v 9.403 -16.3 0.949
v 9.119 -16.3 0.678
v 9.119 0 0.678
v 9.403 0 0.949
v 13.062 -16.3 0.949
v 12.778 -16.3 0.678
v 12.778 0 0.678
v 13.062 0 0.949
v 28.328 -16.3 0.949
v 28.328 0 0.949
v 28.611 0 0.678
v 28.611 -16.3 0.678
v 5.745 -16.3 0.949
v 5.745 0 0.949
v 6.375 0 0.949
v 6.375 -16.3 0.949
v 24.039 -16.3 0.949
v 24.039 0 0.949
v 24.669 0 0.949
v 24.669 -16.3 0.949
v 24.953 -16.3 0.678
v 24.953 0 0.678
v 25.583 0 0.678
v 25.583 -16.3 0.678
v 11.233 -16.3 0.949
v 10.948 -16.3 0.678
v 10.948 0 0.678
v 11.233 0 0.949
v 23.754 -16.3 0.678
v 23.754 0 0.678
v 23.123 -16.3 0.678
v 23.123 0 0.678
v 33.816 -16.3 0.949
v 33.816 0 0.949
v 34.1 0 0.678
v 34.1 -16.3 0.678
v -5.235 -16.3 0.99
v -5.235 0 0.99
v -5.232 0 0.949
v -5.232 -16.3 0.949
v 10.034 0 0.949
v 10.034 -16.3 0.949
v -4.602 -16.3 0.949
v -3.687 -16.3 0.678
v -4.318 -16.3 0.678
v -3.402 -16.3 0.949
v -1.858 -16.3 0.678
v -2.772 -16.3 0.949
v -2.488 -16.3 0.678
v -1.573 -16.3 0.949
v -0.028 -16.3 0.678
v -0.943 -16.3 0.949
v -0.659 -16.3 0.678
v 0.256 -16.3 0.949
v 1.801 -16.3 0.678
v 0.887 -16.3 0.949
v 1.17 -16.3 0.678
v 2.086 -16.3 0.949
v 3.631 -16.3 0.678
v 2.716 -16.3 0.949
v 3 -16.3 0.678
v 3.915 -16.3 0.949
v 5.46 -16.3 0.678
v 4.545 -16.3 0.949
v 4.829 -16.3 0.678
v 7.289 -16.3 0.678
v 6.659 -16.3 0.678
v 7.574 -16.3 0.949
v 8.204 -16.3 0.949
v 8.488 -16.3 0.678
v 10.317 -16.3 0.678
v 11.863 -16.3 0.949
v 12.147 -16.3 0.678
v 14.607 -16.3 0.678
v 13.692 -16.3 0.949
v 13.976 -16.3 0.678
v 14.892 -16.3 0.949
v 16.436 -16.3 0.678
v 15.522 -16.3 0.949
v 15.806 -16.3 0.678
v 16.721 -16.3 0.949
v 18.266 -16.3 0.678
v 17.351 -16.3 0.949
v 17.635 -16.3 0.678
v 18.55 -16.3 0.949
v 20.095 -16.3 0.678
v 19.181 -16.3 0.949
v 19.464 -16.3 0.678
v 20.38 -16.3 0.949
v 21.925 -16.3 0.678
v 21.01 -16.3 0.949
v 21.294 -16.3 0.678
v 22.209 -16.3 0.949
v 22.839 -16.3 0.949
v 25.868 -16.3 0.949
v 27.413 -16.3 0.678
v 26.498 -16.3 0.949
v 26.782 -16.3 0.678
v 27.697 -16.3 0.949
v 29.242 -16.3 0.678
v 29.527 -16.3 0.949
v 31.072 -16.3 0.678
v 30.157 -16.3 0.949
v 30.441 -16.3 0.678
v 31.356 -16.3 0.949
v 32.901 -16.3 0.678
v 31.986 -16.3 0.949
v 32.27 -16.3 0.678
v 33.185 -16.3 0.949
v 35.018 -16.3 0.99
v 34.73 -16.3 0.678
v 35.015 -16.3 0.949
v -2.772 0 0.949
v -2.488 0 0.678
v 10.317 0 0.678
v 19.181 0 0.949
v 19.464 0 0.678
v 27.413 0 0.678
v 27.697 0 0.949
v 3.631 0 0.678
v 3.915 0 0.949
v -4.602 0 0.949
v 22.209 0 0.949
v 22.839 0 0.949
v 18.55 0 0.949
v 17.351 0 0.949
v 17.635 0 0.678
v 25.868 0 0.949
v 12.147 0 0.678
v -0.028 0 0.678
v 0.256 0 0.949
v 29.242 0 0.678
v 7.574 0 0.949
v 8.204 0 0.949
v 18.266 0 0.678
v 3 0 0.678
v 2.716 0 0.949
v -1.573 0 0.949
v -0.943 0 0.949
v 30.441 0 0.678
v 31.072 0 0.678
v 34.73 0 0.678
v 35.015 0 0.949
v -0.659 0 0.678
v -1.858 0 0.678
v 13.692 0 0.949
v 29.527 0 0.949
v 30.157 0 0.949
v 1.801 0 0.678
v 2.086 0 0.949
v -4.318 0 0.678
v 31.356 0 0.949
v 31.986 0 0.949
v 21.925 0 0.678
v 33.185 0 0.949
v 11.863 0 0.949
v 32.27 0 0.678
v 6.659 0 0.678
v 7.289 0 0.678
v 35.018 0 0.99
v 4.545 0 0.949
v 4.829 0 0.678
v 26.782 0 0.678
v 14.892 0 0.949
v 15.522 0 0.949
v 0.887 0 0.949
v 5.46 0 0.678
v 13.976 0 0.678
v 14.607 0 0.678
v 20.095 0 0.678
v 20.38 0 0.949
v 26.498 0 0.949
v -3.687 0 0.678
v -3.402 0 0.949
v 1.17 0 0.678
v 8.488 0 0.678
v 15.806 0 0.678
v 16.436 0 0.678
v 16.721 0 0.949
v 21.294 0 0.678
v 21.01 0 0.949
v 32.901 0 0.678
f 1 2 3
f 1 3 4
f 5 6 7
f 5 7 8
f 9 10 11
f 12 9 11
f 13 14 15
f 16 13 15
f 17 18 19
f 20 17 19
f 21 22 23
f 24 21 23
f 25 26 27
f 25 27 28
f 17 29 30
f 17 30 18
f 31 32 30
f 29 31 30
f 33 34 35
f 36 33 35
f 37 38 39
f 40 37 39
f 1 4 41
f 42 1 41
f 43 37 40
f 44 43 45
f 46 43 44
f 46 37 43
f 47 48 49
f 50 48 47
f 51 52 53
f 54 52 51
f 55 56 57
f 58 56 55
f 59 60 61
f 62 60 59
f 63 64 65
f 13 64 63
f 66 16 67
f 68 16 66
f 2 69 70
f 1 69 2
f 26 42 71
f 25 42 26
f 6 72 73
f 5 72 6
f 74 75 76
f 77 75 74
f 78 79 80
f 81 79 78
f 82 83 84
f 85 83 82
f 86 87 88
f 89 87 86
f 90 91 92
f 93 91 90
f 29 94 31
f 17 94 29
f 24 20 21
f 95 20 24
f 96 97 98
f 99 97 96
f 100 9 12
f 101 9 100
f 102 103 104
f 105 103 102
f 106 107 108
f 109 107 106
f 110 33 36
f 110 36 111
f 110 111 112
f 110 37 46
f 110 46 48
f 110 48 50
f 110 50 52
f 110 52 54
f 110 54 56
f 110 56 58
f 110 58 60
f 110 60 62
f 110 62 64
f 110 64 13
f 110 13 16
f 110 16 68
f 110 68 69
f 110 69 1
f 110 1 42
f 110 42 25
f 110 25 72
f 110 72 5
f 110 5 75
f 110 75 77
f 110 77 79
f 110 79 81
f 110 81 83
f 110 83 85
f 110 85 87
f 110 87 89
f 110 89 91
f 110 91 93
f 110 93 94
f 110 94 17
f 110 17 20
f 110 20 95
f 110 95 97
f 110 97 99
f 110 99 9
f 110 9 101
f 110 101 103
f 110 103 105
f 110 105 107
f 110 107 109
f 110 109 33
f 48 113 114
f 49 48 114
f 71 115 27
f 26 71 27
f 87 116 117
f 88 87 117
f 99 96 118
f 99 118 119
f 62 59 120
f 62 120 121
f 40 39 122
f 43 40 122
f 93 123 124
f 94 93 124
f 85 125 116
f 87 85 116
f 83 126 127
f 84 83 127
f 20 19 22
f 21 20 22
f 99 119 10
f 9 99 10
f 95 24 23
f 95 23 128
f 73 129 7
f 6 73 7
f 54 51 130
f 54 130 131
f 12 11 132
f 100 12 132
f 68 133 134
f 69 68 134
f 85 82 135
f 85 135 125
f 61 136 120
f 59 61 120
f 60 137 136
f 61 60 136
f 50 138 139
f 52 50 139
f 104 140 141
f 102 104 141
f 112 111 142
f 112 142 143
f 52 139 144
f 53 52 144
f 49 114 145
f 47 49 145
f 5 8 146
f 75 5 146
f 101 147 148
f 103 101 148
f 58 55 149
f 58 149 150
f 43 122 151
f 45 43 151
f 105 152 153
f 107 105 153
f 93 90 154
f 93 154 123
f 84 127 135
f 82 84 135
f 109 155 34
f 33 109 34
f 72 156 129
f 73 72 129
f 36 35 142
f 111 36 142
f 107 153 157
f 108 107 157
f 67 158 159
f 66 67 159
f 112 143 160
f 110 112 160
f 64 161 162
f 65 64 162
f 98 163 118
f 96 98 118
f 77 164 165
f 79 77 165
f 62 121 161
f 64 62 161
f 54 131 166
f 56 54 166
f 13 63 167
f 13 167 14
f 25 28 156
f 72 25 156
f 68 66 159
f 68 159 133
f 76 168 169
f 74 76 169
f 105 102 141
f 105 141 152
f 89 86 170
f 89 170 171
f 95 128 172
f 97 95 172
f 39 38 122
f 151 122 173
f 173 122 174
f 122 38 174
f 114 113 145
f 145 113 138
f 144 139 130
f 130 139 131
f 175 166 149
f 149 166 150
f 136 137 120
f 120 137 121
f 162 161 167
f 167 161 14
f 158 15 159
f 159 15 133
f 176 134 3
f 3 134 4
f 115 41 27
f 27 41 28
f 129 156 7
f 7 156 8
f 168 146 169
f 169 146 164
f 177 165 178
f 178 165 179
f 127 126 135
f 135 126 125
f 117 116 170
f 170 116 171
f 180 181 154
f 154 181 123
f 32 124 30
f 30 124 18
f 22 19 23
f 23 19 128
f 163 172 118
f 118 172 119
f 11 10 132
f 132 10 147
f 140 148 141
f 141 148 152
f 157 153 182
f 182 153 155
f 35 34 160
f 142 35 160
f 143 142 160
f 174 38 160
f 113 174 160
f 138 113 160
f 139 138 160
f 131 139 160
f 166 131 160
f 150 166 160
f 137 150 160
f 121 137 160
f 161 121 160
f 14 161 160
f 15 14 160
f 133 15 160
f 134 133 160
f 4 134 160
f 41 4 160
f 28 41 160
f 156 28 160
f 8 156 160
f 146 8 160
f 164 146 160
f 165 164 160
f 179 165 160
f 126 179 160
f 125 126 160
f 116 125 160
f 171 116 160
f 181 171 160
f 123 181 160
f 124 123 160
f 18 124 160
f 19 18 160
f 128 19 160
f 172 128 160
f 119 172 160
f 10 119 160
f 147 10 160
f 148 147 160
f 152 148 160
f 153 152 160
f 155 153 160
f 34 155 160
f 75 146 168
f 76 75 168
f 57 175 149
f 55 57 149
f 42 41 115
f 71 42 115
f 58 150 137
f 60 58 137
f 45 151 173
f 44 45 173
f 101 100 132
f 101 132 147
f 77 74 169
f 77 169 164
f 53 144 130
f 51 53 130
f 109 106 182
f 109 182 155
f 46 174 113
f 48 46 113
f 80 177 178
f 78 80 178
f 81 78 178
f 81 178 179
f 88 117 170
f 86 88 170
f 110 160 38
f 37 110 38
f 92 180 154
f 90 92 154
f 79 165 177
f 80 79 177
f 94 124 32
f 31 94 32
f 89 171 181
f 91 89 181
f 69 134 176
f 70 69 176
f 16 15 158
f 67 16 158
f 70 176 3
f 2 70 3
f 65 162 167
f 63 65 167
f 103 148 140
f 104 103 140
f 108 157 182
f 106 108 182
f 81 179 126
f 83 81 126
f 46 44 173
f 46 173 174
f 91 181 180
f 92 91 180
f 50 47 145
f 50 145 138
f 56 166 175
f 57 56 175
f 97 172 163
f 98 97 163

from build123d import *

# Parameters (mm, degrees)
F1_DEPTH = 16.3


with BuildPart() as f1:
    # F0 (on Front) → F1 (new body)
    with BuildSketch(Plane.XZ):
        Polygon((-3.405686, 0.990338), (-5.235078, 0.990338), (-5.231773, 0.948936), (-4.601518, 0.948936), (-4.317693, 0.678378), (-3.686916, 0.678378), (-3.402381, 0.948936), align=None)
        Polygon((-3.398952, 0.990338), (-3.405686, 0.990338), (-3.402381, 0.948936), align=None)
        Polygon((-1.576294, 0.990338), (-3.398952, 0.990338), (-3.402381, 0.948936), (-2.772126, 0.948936), (-2.4883, 0.678378), (-1.857524, 0.678378), (-1.572988, 0.948936), align=None)
        Polygon((-1.56956, 0.990338), (-1.576294, 0.990338), (-1.572988, 0.948936), align=None)
        Polygon((0.253099, 0.990338), (-1.56956, 0.990338), (-1.572988, 0.948936), (-0.942733, 0.948936), (-0.658908, 0.678378), (-0.028131, 0.678378), (0.256404, 0.948936), align=None)
        Polygon((0.259832, 0.990338), (0.253099, 0.990338), (0.256404, 0.948936), align=None)
        Polygon((2.082491, 0.990338), (0.259832, 0.990338), (0.256404, 0.948936), (0.886659, 0.948936), (1.170484, 0.678378), (1.801261, 0.678378), (2.085796, 0.948936), align=None)
        Polygon((2.089224, 0.990338), (2.082491, 0.990338), (2.085796, 0.948936), align=None)
        Polygon((3.911883, 0.990338), (2.089224, 0.990338), (2.085796, 0.948936), (2.716051, 0.948936), (2.999876, 0.678378), (3.630653, 0.678378), (3.915188, 0.948936), align=None)
        Polygon((3.918617, 0.990338), (3.911883, 0.990338), (3.915188, 0.948936), align=None)
        Polygon((5.741275, 0.990338), (3.918617, 0.990338), (3.915188, 0.948936), (4.545443, 0.948936), (4.829269, 0.678378), (5.460045, 0.678378), (5.744581, 0.948936), align=None)
        Polygon((5.748009, 0.990338), (5.741275, 0.990338), (5.744581, 0.948936), align=None)
        Polygon((7.570668, 0.990338), (5.748009, 0.990338), (5.744581, 0.948936), (6.374836, 0.948936), (6.658661, 0.678378), (7.289438, 0.678378), (7.573973, 0.948936), align=None)
        Polygon((7.577401, 0.990338), (7.570668, 0.990338), (7.573973, 0.948936), align=None)
        Polygon((9.40006, 0.990338), (7.577401, 0.990338), (7.573973, 0.948936), (8.204228, 0.948936), (8.488053, 0.678378), (9.11883, 0.678378), (9.403365, 0.948936), align=None)
        Polygon((9.406793, 0.990338), (9.40006, 0.990338), (9.403365, 0.948936), align=None)
        Polygon((11.229452, 0.990338), (9.406793, 0.990338), (9.403365, 0.948936), (10.03362, 0.948936), (10.317445, 0.678378), (10.948222, 0.678378), (11.232758, 0.948936), align=None)
        Polygon((11.236186, 0.990338), (11.229452, 0.990338), (11.232758, 0.948936), align=None)
        Polygon((13.058844, 0.990338), (11.236186, 0.990338), (11.232758, 0.948936), (11.863013, 0.948936), (12.146838, 0.678378), (12.777615, 0.678378), (13.06215, 0.948936), align=None)
        Polygon((13.065578, 0.990338), (13.058844, 0.990338), (13.06215, 0.948936), align=None)
        Polygon((14.888237, 0.990338), (13.065578, 0.990338), (13.06215, 0.948936), (13.692405, 0.948936), (13.97623, 0.678378), (14.607007, 0.678378), (14.891542, 0.948936), align=None)
        Polygon((14.89497, 0.990338), (14.888237, 0.990338), (14.891542, 0.948936), align=None)
        Polygon((16.717629, 0.990338), (14.89497, 0.990338), (14.891542, 0.948936), (15.521797, 0.948936), (15.805622, 0.678378), (16.436399, 0.678378), (16.720934, 0.948936), align=None)
        Polygon((16.724363, 0.990338), (16.717629, 0.990338), (16.720934, 0.948936), align=None)
        Polygon((18.547021, 0.990338), (16.724363, 0.990338), (16.720934, 0.948936), (17.351189, 0.948936), (17.635015, 0.678378), (18.265791, 0.678378), (18.550327, 0.948936), align=None)
        Polygon((18.553755, 0.990338), (18.547021, 0.990338), (18.550327, 0.948936), align=None)
        Polygon((20.376414, 0.990338), (18.553755, 0.990338), (18.550327, 0.948936), (19.180582, 0.948936), (19.464407, 0.678378), (20.095184, 0.678378), (20.379719, 0.948936), align=None)
        Polygon((20.383147, 0.990338), (20.376414, 0.990338), (20.379719, 0.948936), align=None)
        Polygon((22.205806, 0.990338), (20.383147, 0.990338), (20.379719, 0.948936), (21.009974, 0.948936), (21.293799, 0.678378), (21.924576, 0.678378), (22.209111, 0.948936), align=None)
        Polygon((22.212539, 0.990338), (22.205806, 0.990338), (22.209111, 0.948936), align=None)
        Polygon((24.035198, 0.990338), (22.212539, 0.990338), (22.209111, 0.948936), (22.839366, 0.948936), (23.123191, 0.678378), (23.753968, 0.678378), (24.038504, 0.948936), align=None)
        Polygon((24.041932, 0.990338), (24.035198, 0.990338), (24.038504, 0.948936), align=None)
        Polygon((25.86459, 0.990338), (24.041932, 0.990338), (24.038504, 0.948936), (24.668759, 0.948936), (24.952584, 0.678378), (25.583361, 0.678378), (25.867896, 0.948936), align=None)
        Polygon((25.871324, 0.990338), (25.86459, 0.990338), (25.867896, 0.948936), align=None)
        Polygon((27.693983, 0.990338), (25.871324, 0.990338), (25.867896, 0.948936), (26.498151, 0.948936), (26.781976, 0.678378), (27.412753, 0.678378), (27.697288, 0.948936), align=None)
        Polygon((27.700716, 0.990338), (27.693983, 0.990338), (27.697288, 0.948936), align=None)
        Polygon((29.523375, 0.990338), (27.700716, 0.990338), (27.697288, 0.948936), (28.327543, 0.948936), (28.611368, 0.678378), (29.242145, 0.678378), (29.52668, 0.948936), align=None)
        Polygon((29.530108, 0.990338), (29.523375, 0.990338), (29.52668, 0.948936), align=None)
        Polygon((31.352767, 0.990338), (29.530108, 0.990338), (29.52668, 0.948936), (30.156935, 0.948936), (30.440761, 0.678378), (31.071537, 0.678378), (31.356073, 0.948936), align=None)
        Polygon((31.359501, 0.990338), (31.352767, 0.990338), (31.356073, 0.948936), align=None)
        Polygon((33.18216, 0.990338), (31.359501, 0.990338), (31.356073, 0.948936), (31.986328, 0.948936), (32.270153, 0.678378), (32.90093, 0.678378), (33.185465, 0.948936), align=None)
        Polygon((33.188893, 0.990338), (33.18216, 0.990338), (33.185465, 0.948936), align=None)
        Polygon((35.018285, 0.990338), (33.188893, 0.990338), (33.185465, 0.948936), (33.81572, 0.948936), (34.099545, 0.678378), (34.730322, 0.678378), (35.014857, 0.948936), align=None)
    extrude(amount=F1_DEPTH)


solid = f1.part
